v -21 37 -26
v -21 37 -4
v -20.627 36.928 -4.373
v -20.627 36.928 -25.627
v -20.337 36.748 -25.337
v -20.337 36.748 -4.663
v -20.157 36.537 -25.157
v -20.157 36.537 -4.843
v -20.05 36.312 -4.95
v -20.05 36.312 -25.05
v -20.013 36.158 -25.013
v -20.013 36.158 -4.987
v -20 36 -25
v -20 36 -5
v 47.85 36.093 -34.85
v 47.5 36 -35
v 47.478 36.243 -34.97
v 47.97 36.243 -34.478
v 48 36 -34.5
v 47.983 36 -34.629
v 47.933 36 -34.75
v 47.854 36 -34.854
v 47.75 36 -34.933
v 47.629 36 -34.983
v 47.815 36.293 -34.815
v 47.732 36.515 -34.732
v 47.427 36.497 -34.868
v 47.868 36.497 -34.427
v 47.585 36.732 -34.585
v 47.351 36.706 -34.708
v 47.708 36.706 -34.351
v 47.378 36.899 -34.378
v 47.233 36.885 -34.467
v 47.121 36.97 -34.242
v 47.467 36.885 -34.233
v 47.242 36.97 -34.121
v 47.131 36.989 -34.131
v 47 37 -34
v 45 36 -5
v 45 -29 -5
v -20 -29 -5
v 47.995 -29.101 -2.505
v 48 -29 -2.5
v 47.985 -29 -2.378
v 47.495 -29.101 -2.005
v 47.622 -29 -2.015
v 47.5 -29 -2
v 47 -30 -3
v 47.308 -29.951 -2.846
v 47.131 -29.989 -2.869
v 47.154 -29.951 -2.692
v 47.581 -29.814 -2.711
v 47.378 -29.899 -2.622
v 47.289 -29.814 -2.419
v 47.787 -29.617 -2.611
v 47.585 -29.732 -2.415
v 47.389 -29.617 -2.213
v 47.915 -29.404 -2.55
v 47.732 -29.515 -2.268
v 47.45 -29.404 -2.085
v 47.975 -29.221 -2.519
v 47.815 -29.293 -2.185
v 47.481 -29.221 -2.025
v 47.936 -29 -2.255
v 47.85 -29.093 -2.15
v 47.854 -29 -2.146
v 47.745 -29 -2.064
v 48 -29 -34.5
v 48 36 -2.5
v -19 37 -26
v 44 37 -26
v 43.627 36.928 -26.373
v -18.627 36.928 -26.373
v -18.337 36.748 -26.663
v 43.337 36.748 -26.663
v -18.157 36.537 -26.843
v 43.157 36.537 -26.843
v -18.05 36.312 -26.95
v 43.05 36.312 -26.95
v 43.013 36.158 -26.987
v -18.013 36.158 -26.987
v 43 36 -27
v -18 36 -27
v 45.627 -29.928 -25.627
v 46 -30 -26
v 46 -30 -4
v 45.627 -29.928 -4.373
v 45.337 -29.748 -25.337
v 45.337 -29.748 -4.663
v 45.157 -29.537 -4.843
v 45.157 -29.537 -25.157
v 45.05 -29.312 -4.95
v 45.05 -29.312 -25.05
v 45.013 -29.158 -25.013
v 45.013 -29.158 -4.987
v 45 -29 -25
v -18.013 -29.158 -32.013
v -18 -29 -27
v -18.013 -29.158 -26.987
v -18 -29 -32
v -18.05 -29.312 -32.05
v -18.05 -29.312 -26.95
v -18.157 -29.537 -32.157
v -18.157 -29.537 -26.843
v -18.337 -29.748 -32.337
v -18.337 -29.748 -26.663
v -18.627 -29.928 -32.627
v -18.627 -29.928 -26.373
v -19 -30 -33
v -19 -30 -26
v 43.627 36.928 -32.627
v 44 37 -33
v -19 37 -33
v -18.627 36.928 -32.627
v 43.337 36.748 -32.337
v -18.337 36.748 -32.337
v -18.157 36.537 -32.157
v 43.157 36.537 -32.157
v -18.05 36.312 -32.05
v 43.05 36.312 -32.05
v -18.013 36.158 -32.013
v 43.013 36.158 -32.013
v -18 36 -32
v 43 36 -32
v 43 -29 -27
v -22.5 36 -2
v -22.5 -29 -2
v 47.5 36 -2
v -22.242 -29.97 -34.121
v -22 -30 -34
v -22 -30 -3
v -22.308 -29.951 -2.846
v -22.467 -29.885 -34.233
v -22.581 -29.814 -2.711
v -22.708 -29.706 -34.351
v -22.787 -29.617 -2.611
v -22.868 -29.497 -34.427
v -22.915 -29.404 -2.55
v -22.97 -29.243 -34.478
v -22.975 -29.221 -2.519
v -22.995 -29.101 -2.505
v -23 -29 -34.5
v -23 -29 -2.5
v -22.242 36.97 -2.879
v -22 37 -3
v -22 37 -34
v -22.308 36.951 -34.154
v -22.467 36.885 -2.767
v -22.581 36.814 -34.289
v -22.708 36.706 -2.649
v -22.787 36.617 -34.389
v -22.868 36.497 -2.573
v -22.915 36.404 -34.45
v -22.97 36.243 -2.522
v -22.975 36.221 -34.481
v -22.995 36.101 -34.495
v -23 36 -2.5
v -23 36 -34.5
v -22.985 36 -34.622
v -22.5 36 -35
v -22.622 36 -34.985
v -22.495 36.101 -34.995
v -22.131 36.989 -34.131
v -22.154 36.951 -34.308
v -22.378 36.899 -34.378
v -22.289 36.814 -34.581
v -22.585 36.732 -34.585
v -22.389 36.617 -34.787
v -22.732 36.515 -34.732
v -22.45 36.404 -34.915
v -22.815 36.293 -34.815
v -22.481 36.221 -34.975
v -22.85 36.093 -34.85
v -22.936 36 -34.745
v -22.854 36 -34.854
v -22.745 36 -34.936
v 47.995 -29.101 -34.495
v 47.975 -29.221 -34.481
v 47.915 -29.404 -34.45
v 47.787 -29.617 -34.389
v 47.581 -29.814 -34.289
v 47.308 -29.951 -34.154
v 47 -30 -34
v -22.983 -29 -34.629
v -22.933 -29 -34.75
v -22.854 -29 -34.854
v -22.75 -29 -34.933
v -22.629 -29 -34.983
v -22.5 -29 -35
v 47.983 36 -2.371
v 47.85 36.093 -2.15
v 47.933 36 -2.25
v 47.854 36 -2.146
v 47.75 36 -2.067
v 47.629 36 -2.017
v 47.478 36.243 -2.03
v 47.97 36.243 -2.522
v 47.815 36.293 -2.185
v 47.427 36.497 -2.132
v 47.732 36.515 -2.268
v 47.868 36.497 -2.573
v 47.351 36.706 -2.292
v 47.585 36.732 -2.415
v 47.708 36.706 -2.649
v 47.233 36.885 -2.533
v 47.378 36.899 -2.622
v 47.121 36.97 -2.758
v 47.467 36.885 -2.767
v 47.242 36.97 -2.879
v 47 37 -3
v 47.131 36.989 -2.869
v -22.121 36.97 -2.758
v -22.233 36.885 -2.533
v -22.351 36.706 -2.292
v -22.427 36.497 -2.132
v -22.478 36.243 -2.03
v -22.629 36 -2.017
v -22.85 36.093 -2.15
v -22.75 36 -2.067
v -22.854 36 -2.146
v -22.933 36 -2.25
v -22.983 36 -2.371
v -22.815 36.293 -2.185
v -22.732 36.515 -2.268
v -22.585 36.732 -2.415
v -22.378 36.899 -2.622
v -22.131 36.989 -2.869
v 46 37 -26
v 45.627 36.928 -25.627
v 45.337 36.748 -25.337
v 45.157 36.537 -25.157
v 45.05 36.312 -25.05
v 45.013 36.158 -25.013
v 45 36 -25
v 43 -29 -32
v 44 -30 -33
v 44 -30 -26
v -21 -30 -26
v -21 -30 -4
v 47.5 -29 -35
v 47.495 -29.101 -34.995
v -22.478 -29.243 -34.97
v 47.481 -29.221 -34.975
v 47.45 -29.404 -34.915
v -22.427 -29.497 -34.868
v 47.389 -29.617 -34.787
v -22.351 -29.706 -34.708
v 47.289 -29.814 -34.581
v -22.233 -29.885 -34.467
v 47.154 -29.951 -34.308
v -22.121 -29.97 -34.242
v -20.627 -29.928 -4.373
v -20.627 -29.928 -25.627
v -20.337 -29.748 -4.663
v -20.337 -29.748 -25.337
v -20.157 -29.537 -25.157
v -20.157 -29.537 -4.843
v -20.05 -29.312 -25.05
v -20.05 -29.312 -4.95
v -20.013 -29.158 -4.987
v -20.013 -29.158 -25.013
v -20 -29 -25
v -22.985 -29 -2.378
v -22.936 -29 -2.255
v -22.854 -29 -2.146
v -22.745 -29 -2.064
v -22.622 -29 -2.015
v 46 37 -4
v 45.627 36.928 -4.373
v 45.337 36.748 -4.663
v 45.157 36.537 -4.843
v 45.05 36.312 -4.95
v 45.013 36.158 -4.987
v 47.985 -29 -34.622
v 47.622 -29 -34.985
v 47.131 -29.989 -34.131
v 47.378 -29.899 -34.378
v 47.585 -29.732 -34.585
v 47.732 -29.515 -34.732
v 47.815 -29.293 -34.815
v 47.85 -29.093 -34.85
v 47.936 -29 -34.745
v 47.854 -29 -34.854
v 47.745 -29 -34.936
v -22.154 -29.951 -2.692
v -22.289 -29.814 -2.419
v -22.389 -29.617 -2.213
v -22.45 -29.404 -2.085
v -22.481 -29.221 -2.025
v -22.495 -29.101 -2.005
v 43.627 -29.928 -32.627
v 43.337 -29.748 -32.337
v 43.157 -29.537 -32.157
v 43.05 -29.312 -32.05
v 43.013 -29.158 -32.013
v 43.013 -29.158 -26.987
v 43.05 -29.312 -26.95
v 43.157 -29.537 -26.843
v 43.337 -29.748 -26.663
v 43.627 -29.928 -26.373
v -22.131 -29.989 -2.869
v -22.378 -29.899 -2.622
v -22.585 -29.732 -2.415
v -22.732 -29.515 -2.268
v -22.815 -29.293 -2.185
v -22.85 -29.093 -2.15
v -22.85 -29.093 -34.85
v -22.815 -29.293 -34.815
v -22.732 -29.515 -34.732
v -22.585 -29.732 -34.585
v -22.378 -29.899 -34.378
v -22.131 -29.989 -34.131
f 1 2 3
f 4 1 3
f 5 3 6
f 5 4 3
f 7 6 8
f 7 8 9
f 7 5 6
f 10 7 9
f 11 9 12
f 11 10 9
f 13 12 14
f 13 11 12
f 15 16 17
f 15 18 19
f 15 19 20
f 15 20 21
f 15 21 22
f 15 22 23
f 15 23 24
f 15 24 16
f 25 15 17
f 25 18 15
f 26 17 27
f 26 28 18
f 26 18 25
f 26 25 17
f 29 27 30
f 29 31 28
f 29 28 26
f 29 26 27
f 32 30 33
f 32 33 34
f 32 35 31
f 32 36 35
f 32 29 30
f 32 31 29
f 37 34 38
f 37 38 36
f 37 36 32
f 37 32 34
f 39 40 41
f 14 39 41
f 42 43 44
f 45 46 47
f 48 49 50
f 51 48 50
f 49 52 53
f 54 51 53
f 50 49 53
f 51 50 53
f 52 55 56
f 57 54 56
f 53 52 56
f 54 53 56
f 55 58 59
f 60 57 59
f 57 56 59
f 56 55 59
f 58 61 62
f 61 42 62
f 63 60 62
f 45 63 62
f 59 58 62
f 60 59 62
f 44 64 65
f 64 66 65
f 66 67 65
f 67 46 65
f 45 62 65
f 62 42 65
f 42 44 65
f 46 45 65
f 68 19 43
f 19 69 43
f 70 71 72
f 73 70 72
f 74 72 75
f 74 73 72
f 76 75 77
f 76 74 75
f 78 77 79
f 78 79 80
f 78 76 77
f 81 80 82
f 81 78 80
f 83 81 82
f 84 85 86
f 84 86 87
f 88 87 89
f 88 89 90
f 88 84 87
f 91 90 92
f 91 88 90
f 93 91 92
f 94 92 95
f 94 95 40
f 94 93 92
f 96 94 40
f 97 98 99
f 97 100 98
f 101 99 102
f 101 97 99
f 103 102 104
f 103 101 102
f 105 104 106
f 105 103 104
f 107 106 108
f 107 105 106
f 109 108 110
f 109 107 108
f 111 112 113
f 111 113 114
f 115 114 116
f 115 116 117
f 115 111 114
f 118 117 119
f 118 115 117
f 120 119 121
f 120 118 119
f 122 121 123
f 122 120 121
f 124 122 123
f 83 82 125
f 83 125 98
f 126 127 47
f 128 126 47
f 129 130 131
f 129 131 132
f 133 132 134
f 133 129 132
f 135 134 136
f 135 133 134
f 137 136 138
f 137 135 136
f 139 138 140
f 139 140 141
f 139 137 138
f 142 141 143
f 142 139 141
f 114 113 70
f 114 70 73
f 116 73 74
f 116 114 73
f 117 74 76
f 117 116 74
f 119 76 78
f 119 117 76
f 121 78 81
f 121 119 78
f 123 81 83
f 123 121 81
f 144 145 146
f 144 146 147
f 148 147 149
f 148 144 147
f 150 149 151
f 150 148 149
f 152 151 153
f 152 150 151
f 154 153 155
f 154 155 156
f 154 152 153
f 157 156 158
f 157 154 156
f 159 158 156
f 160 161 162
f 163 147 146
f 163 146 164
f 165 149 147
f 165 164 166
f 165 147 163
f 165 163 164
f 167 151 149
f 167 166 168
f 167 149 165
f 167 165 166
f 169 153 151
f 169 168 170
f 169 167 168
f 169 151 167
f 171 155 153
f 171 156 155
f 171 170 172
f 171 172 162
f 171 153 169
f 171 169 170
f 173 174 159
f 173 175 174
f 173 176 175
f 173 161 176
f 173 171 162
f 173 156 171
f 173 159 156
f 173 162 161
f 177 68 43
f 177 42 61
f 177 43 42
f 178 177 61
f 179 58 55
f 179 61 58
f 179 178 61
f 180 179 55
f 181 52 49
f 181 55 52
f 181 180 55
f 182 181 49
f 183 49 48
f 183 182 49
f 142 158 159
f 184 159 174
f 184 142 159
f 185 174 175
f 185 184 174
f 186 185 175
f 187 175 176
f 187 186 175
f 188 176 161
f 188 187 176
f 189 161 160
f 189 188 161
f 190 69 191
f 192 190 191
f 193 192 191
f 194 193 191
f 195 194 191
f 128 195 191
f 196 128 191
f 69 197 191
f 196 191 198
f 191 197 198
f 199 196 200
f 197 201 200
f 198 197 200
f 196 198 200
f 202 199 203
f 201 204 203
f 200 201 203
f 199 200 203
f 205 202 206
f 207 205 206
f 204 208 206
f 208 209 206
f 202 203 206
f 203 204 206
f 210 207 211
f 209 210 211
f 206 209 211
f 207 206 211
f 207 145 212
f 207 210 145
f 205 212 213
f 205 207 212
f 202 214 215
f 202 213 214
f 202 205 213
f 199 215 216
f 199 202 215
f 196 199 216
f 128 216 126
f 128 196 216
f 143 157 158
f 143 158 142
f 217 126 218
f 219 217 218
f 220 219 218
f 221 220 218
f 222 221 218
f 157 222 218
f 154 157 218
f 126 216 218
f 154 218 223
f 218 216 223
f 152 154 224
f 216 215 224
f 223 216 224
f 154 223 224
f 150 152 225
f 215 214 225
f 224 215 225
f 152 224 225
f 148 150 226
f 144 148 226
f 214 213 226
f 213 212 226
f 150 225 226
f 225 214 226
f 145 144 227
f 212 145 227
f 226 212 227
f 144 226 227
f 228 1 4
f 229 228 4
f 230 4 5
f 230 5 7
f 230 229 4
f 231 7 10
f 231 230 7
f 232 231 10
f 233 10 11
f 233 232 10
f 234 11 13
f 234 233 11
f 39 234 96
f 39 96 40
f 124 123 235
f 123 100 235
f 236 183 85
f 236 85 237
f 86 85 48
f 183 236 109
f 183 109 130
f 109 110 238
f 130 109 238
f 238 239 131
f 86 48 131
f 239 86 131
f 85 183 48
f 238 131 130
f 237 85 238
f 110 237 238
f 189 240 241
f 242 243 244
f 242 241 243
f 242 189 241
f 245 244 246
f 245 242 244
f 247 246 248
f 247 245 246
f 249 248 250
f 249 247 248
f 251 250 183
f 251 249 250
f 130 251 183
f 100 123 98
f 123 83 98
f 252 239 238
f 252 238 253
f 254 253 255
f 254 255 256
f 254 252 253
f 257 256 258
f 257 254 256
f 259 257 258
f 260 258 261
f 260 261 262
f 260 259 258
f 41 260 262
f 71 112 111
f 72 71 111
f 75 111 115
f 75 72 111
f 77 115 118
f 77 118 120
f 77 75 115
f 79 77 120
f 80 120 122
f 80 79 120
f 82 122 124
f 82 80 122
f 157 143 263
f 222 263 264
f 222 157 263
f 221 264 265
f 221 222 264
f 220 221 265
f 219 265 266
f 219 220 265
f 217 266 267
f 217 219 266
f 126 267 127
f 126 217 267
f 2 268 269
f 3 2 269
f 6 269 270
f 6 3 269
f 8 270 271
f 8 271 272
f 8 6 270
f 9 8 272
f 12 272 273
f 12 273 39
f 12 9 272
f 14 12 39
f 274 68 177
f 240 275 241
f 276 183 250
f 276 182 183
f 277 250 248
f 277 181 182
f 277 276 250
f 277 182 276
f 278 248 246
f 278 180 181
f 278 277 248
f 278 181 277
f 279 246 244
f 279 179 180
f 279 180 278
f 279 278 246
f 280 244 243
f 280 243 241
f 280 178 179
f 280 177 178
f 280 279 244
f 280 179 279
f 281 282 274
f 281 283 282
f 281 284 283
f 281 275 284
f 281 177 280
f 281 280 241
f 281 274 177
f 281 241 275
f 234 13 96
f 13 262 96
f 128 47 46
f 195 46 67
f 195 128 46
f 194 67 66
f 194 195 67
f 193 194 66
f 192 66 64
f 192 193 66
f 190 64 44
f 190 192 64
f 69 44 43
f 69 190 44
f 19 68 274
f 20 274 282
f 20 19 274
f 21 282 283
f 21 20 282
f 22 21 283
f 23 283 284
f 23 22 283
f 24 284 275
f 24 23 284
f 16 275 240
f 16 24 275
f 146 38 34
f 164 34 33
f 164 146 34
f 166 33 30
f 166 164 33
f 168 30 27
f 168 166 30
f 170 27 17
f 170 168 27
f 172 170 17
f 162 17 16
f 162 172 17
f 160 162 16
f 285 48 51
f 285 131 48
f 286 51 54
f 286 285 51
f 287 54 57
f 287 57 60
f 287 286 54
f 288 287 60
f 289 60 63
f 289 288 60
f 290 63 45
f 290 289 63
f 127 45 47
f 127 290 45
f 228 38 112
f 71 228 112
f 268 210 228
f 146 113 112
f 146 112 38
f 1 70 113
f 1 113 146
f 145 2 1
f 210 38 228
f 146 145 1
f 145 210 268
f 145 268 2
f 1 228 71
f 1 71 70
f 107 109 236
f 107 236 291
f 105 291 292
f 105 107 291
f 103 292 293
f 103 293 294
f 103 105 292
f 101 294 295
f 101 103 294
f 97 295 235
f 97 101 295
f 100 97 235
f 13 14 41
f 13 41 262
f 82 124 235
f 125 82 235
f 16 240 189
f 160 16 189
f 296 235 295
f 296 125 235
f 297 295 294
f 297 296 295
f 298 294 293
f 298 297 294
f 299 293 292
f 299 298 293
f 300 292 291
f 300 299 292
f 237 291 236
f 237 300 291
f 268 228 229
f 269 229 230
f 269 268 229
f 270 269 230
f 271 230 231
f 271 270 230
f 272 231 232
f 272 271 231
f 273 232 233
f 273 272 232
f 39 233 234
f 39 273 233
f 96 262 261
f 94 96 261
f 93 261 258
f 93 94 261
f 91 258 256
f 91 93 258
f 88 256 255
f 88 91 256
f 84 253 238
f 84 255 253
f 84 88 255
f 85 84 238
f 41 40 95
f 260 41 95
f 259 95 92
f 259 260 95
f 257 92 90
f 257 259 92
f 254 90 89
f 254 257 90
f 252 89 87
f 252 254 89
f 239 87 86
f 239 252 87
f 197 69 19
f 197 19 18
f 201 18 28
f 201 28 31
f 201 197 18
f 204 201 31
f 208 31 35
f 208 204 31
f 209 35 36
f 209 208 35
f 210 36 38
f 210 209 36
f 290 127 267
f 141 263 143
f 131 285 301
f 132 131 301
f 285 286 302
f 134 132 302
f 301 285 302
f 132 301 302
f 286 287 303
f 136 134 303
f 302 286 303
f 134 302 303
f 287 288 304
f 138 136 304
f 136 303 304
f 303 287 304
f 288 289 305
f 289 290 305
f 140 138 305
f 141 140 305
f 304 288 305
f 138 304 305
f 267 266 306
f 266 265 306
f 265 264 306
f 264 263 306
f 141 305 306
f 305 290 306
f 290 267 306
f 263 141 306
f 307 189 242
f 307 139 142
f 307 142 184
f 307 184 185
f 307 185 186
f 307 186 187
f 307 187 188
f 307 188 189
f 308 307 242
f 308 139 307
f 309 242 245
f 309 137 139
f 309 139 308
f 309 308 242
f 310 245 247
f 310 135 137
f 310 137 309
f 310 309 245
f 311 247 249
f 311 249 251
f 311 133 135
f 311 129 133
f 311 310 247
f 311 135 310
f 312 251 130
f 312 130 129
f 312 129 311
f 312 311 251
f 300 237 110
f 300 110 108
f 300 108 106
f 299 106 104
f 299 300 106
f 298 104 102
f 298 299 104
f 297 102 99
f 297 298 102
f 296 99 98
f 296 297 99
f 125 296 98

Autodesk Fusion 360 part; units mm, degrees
sketch "Sketch1" plane through (0, 0, 0) normal (0, 0, 1) x (1, 0, 0)
  line L0 (-25, 25) -> (35, 25)
  line L1 (35, 25) -> (35, -27)
  line L2 (35, -27) -> (-25, -27)
  line L3 (-25, -27) -> (-25, 25)
  dimension "d1" = 60
  dimension "d2" = 52
extrude "Extrude1" add sketch "Sketch1" along normal blind 35
extrude "Extrude2" add 1 faces at (-5, 25, 11.6667) along direction (0, 1, 0) blind 5
extrude "Extrude3" add 1 faces at (15, -27, 11.6667) along direction (0, -1, 0) blind 3
extrude "Extrude4" add 1 faces at (35, 10, 11.6667) along direction (1, 0, 0) blind 15
sketch "Sketch2" plane through (0, 30, 0) normal (0, 1, 0) x (-1, 0, 0)
  line L0 (-50, 0) -> (25, 0)
  line L1 (25, 0) -> (25, 35)
  line L2 (25, 35) -> (-50, 35)
  line L3 (-50, 35) -> (-50, 0)
  line L4 (-45, 30) -> (-45, -21)
  line L5 (-45, -21) -> (20, -21)
  line L6 (20, -21) -> (20, 30)
  line L7 (20, 30) -> (-45, 30)
  dimension "d11" = 51
  dimension "d12" = 65
extrude "Extrude5" add 1 faces at (0, -10, 0) along direction (0, 0, -1) blind 30
extrude "Extrude6" cut sketch "Sketch2" against normal blind 59 contours L0 L4 L6 L7
extrude "Extrude7" cut 1 faces at (23.3333, 10.3333, 0) along direction (0, 0, -1) blind 25
extrude "Extrude8" add 1 faces at (0, -10, -30) along direction (0, 0, -1) blind 6
extrude "Extrude9" cut 1 faces at (50, -10, 11.3333) along direction (-1, 0, 0) blind 2
extrude "Extrude10" cut 1 faces at (-25, 10, -12.3333) along direction (1, 0, 0) blind 2
extrude "Extrude11" cut 1 faces at (0.6667, 10, 35) along direction (0, 0, -1) blind 2
extrude "Extrude12" cut 1 faces at (0.6667, -10, -36) along direction (0, 0, 1) blind 3
sketch "Sketch6" plane through (0, 0, 0) normal (0, 1, 0) x (1, 0, 0)
  line L0 (43, 25) -> (43, 28)
  line L1 (45, 28) -> (-20, 28)
  line L2 (-20, 28) -> (-20, 30)
  line L3 (-20, 30) -> (45, 30)
  line L4 (45, 30) -> (45, 28)
  line L5 (30, 30) -> (30, 33)
  dimension "d31" = 3
extrude "Extrude13" cut sketch "Sketch6" along normal blind 30 and the other way blind 38
extrude "Extrude14" add 1 faces at (23.3333, -29, 11.6667) along direction (0, 1, 0) blind 2
sketch "Sketch7" plane through (0, 0, 0) normal (0, 1, 0) x (1, 0, 0)
sketch "Sketch8" plane through (0, 0, 0) normal (0, 1, 0) x (1, 0, 0)
  line L0 (45, 5) -> (-20, 5)
  line L1 (-20, 5) -> (-20, 25)
  line L2 (-20, 25) -> (45, 25)
  line L3 (45, 25) -> (45, 5)
extrude "Extrude15" cut sketch "Sketch8" against normal blind 68
extrude "Extrude16" add 1 faces at (1.6667, 11, 30) along direction (0, 0, -1) blind 10
extrude "Extrude17" cut 1 faces at (0.6667, 10, 33) along direction (0, 0, -1) blind 10
extrude "Extrude18" add 1 faces at (1.6667, 11, 20) along direction (0, 0, -1) blind 0.5
extrude "Extrude19" cut 1 faces at (0.6667, 10, 23) along direction (0, 0, -1) blind 0.5
extrude "Extrude20" add 1 faces at (1.6667, 11, 19.5) along direction (0, 0, -1) blind 1.5
extrude "Extrude21" cut 1 faces at (0.6667, 10, 22.5) along direction (0, 0, -1) blind 0.5
sketch "Sketch9" plane through (0, 0, 0) normal (0, 1, 0) x (1, 0, 0)
extrude "Extrude22" cut 1 faces at (0.6667, 10, 22) along direction (0, 0, -1) blind 1
extrude "Extrude23" add 1 faces at (1.6667, 11, 18) along direction (0, 0, -1) blind 3
extrude "Extrude24" cut 1 faces at (0.6667, 10, 21) along direction (0, 0, -1) blind 3
sketch "Sketch10" plane through (0, 0, 0) normal (0, 1, 0) x (1, 0, 0)
extrude "Extrude25" add 1 faces at (23.3333, -29, -5) along direction (0, 0, -1) blind 8
extrude "Extrude26" add 1 faces at (-22, 30, -13.3333) along direction (0, 1, 0) blind 5
sketch "Sketch11" plane through (0, 35, 0) normal (0, 1, 0) x (-1, 0, 0)
  line L0 (23, 18) -> (-48, 18)
  line L1 (-48, 18) -> (-48, -33)
  line L2 (-48, -33) -> (23, -33)
  line L3 (23, -33) -> (23, 18)
  line L4 (-45, -30) -> (-45, -28)
  line L5 (-45, -28) -> (20, -28)
  line L6 (20, -28) -> (20, -30)
  line L7 (20, -30) -> (-45, -30)
  line L8 (-45, -25) -> (-45, 15)
  line L9 (-45, 15) -> (20, 15)
  line L10 (20, 15) -> (20, -25)
  line L11 (20, -25) -> (-45, -25)
extrude "Extrude27" add sketch "Sketch11" along normal blind 2
extrude "Extrude28" cut 1 faces at (23.3333, -29, -13) along direction (0, 0, 1) blind 5
extrude "Extrude29" cut 1 faces at (23.3333, -29, -8) along direction (0, 0, 1) blind 3
extrude "Extrude30" add 1 faces at (23.3333, -5.6667, 15) along direction (0, 0, -1) blind 15
extrude "Extrude31" cut 1 faces at (24.3333, 14.6667, 18) along direction (0, 0, -1) blind 15
extrude "Extrude32" add 1 faces at (23.3333, -5.6667, 0) along direction (0, 0, -1) blind 5
extrude "Extrude33" cut 1 faces at (24.3333, 14.6667, 3) along direction (0, 0, -1) blind 5
extrude "Extrude34" add 1 faces at (45, 14.6667, -28.6667) along direction (-1, 0, 0) blind 2
extrude "Extrude35" add 1 faces at (-20, -7.6667, -28.6667) along direction (1, 0, 0) blind 2
extrude "Extrude36" cut 1 faces at (22.6667, -7.6667, -28) along direction (0, 0, 1) blind 1
extrude "Extrude37" cut 1 faces at (2.3333, -7.6667, -30) along direction (0, 0, -1) blind 1
extrude "Extrude38" cut 1 faces at (2.3333, -7.6667, -31) along direction (0, 0, -1) blind 1
extrude "Extrude39" add 1 faces at (24.3333, -7.6667, -33) along direction (0, 0, -1) blind 1
extrude "Extrude40" add 1 faces at (24.3333, -7.6667, -34) along direction (0, 0, -1) blind 1
fillet "Fillet1" radius 1 1 faces at (-20.3333, 37, -30.6667)
fillet "Fillet2" radius 1 1 faces at (-20.3333, -30, -30.6667)
fillet "Fillet4" radius 0.5 3 edges at (47.7071, 36.7071, -2.2929) (48, 3.5, -2) (47.7071, -29.7071, -2.2929)
fillet "Fillet5" radius 0.5 3 edges at (47.7071, 36.7071, -34.7071) (48, 3.5, -35) (47.7071, -29.7071, -34.7071)
fillet "Fillet6" radius 0.5 3 edges at (-22.7071, -29.7071, -2.2929) (-23, 3.5, -2) (-22.7071, 36.7071, -2.2929)
fillet "Fillet7" radius 0.5 3 edges at (-22.7071, -29.7071, -34.7071) (-23, 3.5, -35) (-22.7071, 36.7071, -34.7071)
